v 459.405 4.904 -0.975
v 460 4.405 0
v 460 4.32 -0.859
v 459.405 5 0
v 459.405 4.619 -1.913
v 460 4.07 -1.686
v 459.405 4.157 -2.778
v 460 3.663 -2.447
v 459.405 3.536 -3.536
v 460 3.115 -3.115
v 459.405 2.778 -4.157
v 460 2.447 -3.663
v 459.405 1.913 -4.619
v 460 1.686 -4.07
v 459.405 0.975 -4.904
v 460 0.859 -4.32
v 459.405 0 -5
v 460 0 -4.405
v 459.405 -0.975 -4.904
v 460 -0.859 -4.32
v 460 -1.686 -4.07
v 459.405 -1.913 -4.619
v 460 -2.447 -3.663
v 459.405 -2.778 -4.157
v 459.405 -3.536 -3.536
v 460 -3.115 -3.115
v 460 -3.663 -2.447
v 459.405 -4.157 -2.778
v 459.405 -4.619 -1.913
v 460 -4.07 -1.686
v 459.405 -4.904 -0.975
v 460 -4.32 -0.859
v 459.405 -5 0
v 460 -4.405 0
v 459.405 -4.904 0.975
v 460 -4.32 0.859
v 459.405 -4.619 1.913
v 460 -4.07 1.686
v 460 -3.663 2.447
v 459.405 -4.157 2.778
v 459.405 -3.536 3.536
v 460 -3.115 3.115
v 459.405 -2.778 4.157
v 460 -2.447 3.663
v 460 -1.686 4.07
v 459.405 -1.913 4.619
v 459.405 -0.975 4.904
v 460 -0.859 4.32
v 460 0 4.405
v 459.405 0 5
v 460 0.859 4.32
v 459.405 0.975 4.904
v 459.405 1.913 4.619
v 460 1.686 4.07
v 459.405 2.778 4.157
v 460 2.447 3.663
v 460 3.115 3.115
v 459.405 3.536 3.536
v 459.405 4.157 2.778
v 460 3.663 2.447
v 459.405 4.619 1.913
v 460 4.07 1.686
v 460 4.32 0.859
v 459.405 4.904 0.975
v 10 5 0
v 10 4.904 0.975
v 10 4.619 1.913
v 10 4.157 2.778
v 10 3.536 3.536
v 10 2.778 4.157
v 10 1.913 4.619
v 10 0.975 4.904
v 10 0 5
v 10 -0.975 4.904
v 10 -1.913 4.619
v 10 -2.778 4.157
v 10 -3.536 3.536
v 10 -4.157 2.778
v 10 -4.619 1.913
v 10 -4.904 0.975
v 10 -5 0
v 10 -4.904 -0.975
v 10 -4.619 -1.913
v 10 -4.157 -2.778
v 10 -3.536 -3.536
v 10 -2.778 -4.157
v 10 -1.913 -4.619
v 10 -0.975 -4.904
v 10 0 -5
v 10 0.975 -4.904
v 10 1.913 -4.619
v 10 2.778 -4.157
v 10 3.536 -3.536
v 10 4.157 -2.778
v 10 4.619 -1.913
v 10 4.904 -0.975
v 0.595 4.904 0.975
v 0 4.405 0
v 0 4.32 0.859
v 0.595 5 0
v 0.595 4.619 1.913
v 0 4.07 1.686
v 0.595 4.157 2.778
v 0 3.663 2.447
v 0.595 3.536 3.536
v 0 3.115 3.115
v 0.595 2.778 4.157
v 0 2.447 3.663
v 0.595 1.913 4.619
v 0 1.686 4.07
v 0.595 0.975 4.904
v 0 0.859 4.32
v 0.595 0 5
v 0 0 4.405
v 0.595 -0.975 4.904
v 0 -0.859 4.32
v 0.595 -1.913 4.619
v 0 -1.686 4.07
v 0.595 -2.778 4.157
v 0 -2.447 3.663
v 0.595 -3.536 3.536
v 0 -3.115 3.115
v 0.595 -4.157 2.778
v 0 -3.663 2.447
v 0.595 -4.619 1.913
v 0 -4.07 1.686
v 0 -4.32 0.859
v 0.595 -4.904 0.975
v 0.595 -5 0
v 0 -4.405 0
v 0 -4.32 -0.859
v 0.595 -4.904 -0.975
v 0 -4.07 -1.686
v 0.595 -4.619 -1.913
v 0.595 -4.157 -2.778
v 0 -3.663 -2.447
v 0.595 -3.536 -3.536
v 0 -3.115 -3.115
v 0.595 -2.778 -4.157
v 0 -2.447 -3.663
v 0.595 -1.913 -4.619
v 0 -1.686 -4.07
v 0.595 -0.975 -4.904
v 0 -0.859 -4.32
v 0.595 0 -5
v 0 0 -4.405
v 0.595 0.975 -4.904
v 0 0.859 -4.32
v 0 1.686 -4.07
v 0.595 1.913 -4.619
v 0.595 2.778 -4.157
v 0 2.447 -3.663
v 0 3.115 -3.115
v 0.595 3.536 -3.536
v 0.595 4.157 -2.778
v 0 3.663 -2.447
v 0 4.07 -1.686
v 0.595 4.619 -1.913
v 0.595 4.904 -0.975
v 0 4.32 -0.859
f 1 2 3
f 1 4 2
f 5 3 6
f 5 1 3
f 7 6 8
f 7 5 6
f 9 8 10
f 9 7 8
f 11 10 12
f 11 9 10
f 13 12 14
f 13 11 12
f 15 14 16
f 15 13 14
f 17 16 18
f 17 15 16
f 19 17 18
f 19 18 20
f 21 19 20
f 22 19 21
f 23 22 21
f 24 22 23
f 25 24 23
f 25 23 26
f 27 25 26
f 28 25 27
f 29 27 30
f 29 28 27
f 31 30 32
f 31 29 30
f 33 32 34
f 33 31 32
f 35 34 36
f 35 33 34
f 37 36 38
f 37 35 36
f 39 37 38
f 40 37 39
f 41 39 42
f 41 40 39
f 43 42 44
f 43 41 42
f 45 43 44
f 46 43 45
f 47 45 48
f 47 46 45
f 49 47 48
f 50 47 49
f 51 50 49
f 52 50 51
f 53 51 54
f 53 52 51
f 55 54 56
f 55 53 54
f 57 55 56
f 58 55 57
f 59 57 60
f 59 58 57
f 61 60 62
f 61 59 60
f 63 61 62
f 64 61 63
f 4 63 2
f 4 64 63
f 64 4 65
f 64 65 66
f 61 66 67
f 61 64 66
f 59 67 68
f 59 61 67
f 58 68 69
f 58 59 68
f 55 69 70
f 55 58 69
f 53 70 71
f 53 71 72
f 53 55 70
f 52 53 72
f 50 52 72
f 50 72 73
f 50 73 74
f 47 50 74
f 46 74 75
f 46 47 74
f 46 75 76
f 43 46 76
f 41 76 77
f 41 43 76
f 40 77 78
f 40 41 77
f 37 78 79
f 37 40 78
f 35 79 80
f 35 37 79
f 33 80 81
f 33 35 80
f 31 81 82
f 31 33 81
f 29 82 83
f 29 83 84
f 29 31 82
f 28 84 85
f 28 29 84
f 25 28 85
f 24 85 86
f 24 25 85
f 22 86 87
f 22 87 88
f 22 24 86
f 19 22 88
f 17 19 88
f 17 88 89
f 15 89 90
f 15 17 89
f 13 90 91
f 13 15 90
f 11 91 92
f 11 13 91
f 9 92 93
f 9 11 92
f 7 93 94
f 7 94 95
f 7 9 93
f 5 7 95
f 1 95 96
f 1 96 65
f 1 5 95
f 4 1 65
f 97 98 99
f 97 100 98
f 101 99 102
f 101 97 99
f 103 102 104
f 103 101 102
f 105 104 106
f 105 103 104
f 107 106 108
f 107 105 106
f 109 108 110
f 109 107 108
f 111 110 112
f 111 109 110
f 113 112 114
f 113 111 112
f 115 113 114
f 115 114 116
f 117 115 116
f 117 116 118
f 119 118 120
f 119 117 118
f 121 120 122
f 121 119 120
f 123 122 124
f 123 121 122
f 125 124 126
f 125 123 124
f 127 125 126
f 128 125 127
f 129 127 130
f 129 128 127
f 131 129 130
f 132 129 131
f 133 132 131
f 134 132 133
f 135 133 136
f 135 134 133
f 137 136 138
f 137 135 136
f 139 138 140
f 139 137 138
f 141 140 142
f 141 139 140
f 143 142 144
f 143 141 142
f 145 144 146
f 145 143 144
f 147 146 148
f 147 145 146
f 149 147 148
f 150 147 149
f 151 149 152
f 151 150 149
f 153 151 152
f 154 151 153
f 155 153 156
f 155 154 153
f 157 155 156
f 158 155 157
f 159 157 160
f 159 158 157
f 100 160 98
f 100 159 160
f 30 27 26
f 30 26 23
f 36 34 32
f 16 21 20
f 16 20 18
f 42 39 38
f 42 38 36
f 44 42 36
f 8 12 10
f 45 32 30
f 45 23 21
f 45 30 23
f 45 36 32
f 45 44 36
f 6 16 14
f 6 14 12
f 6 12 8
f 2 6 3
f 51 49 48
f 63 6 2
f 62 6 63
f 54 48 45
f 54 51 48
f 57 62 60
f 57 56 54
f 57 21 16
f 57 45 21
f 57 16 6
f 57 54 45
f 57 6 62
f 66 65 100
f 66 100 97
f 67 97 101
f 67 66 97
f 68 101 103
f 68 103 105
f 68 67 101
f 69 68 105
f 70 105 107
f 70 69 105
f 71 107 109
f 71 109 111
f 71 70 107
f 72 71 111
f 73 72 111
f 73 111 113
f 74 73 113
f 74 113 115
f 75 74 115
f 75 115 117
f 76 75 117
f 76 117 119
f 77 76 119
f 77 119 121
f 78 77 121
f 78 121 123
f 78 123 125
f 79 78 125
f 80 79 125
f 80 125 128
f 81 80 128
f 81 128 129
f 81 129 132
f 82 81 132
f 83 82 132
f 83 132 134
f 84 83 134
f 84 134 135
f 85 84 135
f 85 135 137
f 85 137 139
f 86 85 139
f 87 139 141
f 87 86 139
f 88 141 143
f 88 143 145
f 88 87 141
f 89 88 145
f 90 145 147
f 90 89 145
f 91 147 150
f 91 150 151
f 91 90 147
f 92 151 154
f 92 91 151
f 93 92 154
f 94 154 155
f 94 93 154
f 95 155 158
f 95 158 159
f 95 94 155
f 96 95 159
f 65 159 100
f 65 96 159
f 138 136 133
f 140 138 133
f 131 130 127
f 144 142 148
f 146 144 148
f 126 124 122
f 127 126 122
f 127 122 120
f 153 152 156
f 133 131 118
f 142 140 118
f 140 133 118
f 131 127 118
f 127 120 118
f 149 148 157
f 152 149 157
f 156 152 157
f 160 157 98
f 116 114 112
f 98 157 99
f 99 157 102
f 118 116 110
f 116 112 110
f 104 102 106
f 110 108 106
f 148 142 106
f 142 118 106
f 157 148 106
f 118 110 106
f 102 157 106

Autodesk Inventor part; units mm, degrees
ref_plane "Start Plane" through (0, 0, 0) normal (1, 0, 0) x (0, 1, 0)
ref_plane "XZ Plane" through (0, 0, 0) normal (0, 1, 0) x (-1, 0, 0)
ref_plane "XY Plane" through (0, 0, 0) normal (0, 0, 1) x (1, 0, 0)
sketch "Main Sketch" plane through (0, 0, 0) normal (0, 0, 1) x (1, 0, 0)
  line L0 (0, 0) -> (460, 0)
  line L1 (460, 5) -> (460, 0)
  line L2 (10, 5) -> (460, 5)
  line L3 (0, 0) -> (0, 5)
  line L4 (0, 5) -> (10, 5)
  dimension "d3" = 10
  dimension "d15" = 10
revolve "Revolution1" add sketch "Main Sketch" angle 360 about axis through (0, 0, 0) along (1, 0, 0)
chamfer "Chamfer4" distance 0.595 angle 45 1 edges at (0, -5, 0) measured on face at (3.3333, 4.9353, -0.8021)
chamfer "Chamfer3" distance 0.595 angle 45 1 edges at (460, -5, 0) measured on face at (160, 4.9838, -0.4023)
properties part number "Eje Principal - Interno" material "Aluminum 6061"
